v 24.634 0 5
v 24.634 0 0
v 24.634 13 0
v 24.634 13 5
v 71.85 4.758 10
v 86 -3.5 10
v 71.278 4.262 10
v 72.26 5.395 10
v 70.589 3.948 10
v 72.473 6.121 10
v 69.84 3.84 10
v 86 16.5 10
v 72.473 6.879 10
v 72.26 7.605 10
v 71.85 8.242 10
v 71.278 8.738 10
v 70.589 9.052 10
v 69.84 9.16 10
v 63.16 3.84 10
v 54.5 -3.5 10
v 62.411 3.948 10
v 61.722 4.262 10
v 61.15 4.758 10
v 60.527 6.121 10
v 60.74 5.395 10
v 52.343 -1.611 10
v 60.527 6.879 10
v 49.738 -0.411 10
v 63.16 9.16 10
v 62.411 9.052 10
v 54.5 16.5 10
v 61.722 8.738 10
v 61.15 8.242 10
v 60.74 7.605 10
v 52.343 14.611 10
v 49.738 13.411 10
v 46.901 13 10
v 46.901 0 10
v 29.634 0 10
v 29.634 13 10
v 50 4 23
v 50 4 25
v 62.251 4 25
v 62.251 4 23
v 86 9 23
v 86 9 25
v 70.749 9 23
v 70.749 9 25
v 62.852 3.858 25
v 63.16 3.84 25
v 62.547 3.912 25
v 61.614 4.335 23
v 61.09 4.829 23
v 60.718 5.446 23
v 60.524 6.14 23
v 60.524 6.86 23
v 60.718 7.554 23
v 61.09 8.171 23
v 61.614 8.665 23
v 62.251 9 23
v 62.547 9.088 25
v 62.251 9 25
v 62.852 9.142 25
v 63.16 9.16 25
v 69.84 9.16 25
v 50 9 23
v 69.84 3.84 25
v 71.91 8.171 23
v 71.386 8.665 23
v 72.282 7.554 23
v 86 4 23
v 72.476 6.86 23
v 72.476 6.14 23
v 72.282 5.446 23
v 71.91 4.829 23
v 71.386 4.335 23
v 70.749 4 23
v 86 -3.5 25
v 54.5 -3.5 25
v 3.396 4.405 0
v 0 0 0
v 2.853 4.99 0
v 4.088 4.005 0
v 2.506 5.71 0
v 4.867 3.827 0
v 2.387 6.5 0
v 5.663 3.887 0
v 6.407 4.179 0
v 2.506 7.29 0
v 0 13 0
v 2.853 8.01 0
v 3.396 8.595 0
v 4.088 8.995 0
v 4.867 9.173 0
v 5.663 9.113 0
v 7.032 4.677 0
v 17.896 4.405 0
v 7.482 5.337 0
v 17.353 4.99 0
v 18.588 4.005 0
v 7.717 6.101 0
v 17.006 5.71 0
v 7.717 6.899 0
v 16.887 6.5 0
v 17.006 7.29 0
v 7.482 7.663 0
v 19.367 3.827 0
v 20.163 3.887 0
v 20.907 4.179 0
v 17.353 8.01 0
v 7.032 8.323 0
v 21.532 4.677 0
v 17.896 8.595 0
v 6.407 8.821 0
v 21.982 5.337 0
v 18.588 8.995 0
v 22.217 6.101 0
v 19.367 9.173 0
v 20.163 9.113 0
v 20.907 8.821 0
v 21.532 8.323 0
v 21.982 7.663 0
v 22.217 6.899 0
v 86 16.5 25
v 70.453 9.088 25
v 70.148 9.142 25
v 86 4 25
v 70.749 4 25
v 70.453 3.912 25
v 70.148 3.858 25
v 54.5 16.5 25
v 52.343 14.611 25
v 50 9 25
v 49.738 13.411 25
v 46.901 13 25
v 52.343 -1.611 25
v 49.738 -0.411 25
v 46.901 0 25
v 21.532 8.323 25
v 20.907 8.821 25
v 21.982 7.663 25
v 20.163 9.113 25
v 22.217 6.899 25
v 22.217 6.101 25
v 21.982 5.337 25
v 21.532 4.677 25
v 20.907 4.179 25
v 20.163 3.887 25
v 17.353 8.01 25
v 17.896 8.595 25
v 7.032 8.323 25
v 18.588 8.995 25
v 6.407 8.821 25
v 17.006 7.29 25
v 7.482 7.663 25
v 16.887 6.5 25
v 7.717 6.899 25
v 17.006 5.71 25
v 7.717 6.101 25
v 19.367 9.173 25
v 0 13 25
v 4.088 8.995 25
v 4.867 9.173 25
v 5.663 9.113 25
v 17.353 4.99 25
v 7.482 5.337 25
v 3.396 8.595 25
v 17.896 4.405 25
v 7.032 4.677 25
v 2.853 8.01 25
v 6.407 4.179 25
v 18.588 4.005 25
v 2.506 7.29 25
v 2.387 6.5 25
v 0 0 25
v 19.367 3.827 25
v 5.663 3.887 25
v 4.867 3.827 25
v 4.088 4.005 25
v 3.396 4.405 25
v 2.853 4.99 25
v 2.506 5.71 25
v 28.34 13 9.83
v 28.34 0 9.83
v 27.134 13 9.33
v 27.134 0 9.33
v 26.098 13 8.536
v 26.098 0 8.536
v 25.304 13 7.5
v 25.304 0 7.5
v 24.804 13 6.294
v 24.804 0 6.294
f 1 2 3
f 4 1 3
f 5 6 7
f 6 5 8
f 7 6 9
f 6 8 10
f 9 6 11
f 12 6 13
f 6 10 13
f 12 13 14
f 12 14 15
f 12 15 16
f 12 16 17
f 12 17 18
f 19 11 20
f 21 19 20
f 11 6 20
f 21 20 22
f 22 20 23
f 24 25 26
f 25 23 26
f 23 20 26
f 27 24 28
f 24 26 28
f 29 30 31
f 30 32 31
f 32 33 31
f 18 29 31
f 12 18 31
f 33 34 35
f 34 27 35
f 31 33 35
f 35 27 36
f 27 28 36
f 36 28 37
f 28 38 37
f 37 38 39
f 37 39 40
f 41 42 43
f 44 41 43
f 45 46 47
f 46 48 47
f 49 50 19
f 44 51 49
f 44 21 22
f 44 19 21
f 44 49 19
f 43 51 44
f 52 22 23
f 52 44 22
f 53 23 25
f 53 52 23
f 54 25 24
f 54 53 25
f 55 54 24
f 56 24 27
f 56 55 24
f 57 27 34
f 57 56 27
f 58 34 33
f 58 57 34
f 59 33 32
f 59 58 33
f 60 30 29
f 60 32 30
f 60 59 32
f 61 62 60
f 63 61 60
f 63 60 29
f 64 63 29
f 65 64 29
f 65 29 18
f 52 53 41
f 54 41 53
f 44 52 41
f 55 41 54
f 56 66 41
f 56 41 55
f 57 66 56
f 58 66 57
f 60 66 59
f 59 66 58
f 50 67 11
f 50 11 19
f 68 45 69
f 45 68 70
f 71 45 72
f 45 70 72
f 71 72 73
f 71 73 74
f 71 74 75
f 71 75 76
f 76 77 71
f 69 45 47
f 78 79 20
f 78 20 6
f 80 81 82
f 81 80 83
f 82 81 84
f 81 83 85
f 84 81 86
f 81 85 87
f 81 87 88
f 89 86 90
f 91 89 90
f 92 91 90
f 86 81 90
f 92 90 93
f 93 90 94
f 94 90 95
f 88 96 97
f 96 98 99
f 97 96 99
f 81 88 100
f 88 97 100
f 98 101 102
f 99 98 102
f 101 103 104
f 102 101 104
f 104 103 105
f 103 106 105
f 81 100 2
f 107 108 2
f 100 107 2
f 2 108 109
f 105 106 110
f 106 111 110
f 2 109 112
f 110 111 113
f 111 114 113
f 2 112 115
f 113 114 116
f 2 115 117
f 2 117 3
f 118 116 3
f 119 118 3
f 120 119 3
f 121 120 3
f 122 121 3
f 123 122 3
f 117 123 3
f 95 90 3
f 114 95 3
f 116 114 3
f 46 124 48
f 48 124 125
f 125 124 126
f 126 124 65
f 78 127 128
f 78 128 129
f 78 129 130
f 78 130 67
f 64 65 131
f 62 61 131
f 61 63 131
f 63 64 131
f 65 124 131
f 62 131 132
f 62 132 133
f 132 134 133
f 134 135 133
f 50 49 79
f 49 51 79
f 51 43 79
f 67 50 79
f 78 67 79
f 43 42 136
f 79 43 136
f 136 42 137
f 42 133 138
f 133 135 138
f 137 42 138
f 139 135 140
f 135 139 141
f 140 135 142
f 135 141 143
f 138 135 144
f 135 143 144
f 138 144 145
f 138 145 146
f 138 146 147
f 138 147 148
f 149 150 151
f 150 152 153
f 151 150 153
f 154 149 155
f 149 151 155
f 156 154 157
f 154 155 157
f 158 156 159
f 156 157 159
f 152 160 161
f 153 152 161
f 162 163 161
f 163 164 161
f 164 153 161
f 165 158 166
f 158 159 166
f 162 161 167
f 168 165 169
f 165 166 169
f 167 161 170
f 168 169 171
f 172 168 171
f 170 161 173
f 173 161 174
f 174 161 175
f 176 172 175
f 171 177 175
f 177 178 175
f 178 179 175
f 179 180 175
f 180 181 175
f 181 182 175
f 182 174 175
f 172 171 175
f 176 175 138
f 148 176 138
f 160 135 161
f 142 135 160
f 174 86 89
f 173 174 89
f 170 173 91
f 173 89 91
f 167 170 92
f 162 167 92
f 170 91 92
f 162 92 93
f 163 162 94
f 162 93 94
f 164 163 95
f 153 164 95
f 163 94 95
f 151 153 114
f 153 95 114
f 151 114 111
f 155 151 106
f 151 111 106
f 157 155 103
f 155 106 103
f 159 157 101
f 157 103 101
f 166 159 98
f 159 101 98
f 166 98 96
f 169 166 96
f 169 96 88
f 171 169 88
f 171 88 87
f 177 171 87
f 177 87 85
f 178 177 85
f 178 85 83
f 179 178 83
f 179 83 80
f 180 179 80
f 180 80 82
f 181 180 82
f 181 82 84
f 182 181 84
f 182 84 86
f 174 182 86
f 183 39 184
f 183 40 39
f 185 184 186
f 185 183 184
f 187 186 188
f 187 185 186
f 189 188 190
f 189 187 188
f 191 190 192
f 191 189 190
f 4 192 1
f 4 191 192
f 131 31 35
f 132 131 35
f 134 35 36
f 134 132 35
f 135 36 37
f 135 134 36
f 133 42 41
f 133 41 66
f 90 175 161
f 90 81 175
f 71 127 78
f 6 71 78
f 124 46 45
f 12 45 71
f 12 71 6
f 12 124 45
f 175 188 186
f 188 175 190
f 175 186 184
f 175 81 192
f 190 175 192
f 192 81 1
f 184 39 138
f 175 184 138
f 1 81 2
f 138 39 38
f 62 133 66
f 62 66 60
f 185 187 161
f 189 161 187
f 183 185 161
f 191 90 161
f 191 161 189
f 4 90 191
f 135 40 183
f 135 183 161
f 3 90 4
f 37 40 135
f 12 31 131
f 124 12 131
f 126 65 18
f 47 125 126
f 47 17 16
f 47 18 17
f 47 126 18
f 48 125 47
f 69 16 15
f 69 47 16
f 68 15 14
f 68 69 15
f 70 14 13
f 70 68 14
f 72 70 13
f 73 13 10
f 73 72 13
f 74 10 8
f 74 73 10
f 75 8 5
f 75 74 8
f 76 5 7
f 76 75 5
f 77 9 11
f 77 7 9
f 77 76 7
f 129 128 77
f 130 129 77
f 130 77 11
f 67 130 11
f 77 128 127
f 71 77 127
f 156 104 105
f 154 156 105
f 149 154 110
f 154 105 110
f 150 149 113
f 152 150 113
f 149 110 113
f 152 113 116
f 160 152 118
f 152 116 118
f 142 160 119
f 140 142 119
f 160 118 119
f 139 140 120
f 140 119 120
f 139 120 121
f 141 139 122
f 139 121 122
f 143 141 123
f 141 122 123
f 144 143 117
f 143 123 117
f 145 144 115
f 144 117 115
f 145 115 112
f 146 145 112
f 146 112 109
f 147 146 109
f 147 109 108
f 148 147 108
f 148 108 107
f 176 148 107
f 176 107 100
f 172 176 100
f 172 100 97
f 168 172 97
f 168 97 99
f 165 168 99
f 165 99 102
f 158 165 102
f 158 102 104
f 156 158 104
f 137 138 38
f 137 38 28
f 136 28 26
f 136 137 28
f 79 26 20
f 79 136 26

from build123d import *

# Parameters (mm, degrees)
SKETCH1_W           = 24.634
SKETCH1_H           = 13
BOSS_EXTRUDE1_DEPTH = 10
SKETCH4_W           = 82.5
SKETCH4_H           = 13
BOSS_EXTRUDE4_DEPTH = 15
SKETCH5_W           = 28
SKETCH5_H           = 3.5
BOSS_EXTRUDE5_DEPTH = 15
CUT_EXTRUDE1_DEPTH  = 88.769584709
SKETCH7_W           = 32.5
SKETCH7_H           = 5
CUT_EXTRUDE2_DEPTH  = 2
SKETCH11_R          = 2.68
CUT_EXTRUDE3_DEPTH  = 88.769584709
FILLET1_R           = 10
FILLET2_R           = 5
BOSS_EXTRUDE6_DEPTH = 3.5


with BuildPart() as part:
    # Sketch1 → Boss-Extrude1 (new body)
    with BuildSketch(Plane.XY):
        with Locations((12.317, 6.5)):
            Rectangle(SKETCH1_W, SKETCH1_H)
    extrude(amount=BOSS_EXTRUDE1_DEPTH)

    # Sketch4 → Boss-Extrude4 (add)
    with BuildSketch(Plane.XY.offset(10)):
        with Locations((41.25, 6.5)):
            Rectangle(SKETCH4_W, SKETCH4_H)
    extrude(amount=BOSS_EXTRUDE4_DEPTH)

    # Sketch5 → Boss-Extrude5 (add)
    with BuildSketch(Plane.XY.offset(25)):
        with Locations((68.5, -1.75)):
            Rectangle(SKETCH5_W, SKETCH5_H)
        with Locations((68.5, 14.75)):
            Rectangle(SKETCH5_W, SKETCH5_H)
    extrude(amount=-BOSS_EXTRUDE5_DEPTH)

    # Sketch6 → Cut-Extrude1 (cut, through all)
    with BuildSketch(Plane.XY.offset(25)):
        with BuildLine():
            Line((63.16, 9.16), (69.84, 9.16))
            ThreePointArc((69.84, 9.16), (72.5, 6.5), (69.84, 3.84))
            Line((69.84, 3.84), (63.16, 3.84))
            ThreePointArc((63.16, 3.84), (60.5, 6.5), (63.16, 9.16))
        make_face()
    extrude(amount=-CUT_EXTRUDE1_DEPTH, mode=Mode.SUBTRACT)

    # Sketch7 → Cut-Extrude2 (cut)
    with BuildSketch(Plane.XY.offset(25)):
        with Locations((66.25, 6.5)):
            Rectangle(SKETCH7_W, SKETCH7_H)
    extrude(amount=-CUT_EXTRUDE2_DEPTH, mode=Mode.SUBTRACT)

    # Sketch11 → Cut-Extrude3 (cut, through all)
    with BuildSketch(Plane(origin=(0, 0, 0), x_dir=(-1, 0, 0), z_dir=(0, 0, -1))):
        with Locations((-5.067, 6.5)):
            Circle(SKETCH11_R)
        with Locations((-19.567, 6.5)):
            Circle(SKETCH11_R)
    extrude(amount=-CUT_EXTRUDE3_DEPTH, mode=Mode.SUBTRACT)

    # Fillet1
    # the kernel refuses this fillet: 10 mm, written as the material it adds along each edge
    with BuildSketch(Plane(origin=(54.5, 13, 25), x_dir=(-1, 0, 0), z_dir=(0, 0, -1))) as fillet1_piece_1:
        with BuildLine():
            CenterArc((7.599342077, 10), FILLET1_R, 220.541601874, 49.458398126)
            Line((0, 3.5), (-0.151986842, 3.37))
            ThreePointArc((-0.151986842, 3.37), (-0.2, 1.75), (-0.2, 0))
            Line((-0.2, 0), (0, -0.2))
            Line((0, -0.2), (7.599342077, -0.2))
            Line((7.599342077, -0.2), (7.599342077, 0))
        make_face()
    extrude(amount=15)
    with BuildSketch(Plane(origin=(54.5, 0, 25), x_dir=(-1, 0, 0), z_dir=(0, 0, -1))) as fillet1_piece_2:
        with BuildLine():
            CenterArc((7.599342077, -10), FILLET1_R, 90, 49.458398126)
            Line((0, -3.5), (-0.151986842, -3.37))
            ThreePointArc((-0.151986842, -3.37), (-0.2, -1.75), (-0.2, 0))
            Line((-0.2, 0), (0, 0.2))
            Line((0, 0.2), (7.599342077, 0.2))
            Line((7.599342077, 0.2), (7.599342077, 0))
        make_face()
    extrude(amount=15)

    # Fillet2
    fillet2_edges = [part.edges().sort_by_distance(p)[0] for p in [
        (24.634, 6.5, 10),
    ]]
    fillet(fillet2_edges, radius=FILLET2_R)

    # Sketch12 → Boss-Extrude6 (add)
    with BuildSketch(Plane(origin=(82.5, 0, 0), x_dir=(0, 0, -1), z_dir=(1, 0, 0))):
        Polygon((-25, 16.5), (-25, 9), (-23, 9), (-23, 4), (-25, 4), (-25, -3.5), (-10, -3.5), (-10, 16.5), align=None)
    extrude(amount=BOSS_EXTRUDE6_DEPTH)


solid = part.part
